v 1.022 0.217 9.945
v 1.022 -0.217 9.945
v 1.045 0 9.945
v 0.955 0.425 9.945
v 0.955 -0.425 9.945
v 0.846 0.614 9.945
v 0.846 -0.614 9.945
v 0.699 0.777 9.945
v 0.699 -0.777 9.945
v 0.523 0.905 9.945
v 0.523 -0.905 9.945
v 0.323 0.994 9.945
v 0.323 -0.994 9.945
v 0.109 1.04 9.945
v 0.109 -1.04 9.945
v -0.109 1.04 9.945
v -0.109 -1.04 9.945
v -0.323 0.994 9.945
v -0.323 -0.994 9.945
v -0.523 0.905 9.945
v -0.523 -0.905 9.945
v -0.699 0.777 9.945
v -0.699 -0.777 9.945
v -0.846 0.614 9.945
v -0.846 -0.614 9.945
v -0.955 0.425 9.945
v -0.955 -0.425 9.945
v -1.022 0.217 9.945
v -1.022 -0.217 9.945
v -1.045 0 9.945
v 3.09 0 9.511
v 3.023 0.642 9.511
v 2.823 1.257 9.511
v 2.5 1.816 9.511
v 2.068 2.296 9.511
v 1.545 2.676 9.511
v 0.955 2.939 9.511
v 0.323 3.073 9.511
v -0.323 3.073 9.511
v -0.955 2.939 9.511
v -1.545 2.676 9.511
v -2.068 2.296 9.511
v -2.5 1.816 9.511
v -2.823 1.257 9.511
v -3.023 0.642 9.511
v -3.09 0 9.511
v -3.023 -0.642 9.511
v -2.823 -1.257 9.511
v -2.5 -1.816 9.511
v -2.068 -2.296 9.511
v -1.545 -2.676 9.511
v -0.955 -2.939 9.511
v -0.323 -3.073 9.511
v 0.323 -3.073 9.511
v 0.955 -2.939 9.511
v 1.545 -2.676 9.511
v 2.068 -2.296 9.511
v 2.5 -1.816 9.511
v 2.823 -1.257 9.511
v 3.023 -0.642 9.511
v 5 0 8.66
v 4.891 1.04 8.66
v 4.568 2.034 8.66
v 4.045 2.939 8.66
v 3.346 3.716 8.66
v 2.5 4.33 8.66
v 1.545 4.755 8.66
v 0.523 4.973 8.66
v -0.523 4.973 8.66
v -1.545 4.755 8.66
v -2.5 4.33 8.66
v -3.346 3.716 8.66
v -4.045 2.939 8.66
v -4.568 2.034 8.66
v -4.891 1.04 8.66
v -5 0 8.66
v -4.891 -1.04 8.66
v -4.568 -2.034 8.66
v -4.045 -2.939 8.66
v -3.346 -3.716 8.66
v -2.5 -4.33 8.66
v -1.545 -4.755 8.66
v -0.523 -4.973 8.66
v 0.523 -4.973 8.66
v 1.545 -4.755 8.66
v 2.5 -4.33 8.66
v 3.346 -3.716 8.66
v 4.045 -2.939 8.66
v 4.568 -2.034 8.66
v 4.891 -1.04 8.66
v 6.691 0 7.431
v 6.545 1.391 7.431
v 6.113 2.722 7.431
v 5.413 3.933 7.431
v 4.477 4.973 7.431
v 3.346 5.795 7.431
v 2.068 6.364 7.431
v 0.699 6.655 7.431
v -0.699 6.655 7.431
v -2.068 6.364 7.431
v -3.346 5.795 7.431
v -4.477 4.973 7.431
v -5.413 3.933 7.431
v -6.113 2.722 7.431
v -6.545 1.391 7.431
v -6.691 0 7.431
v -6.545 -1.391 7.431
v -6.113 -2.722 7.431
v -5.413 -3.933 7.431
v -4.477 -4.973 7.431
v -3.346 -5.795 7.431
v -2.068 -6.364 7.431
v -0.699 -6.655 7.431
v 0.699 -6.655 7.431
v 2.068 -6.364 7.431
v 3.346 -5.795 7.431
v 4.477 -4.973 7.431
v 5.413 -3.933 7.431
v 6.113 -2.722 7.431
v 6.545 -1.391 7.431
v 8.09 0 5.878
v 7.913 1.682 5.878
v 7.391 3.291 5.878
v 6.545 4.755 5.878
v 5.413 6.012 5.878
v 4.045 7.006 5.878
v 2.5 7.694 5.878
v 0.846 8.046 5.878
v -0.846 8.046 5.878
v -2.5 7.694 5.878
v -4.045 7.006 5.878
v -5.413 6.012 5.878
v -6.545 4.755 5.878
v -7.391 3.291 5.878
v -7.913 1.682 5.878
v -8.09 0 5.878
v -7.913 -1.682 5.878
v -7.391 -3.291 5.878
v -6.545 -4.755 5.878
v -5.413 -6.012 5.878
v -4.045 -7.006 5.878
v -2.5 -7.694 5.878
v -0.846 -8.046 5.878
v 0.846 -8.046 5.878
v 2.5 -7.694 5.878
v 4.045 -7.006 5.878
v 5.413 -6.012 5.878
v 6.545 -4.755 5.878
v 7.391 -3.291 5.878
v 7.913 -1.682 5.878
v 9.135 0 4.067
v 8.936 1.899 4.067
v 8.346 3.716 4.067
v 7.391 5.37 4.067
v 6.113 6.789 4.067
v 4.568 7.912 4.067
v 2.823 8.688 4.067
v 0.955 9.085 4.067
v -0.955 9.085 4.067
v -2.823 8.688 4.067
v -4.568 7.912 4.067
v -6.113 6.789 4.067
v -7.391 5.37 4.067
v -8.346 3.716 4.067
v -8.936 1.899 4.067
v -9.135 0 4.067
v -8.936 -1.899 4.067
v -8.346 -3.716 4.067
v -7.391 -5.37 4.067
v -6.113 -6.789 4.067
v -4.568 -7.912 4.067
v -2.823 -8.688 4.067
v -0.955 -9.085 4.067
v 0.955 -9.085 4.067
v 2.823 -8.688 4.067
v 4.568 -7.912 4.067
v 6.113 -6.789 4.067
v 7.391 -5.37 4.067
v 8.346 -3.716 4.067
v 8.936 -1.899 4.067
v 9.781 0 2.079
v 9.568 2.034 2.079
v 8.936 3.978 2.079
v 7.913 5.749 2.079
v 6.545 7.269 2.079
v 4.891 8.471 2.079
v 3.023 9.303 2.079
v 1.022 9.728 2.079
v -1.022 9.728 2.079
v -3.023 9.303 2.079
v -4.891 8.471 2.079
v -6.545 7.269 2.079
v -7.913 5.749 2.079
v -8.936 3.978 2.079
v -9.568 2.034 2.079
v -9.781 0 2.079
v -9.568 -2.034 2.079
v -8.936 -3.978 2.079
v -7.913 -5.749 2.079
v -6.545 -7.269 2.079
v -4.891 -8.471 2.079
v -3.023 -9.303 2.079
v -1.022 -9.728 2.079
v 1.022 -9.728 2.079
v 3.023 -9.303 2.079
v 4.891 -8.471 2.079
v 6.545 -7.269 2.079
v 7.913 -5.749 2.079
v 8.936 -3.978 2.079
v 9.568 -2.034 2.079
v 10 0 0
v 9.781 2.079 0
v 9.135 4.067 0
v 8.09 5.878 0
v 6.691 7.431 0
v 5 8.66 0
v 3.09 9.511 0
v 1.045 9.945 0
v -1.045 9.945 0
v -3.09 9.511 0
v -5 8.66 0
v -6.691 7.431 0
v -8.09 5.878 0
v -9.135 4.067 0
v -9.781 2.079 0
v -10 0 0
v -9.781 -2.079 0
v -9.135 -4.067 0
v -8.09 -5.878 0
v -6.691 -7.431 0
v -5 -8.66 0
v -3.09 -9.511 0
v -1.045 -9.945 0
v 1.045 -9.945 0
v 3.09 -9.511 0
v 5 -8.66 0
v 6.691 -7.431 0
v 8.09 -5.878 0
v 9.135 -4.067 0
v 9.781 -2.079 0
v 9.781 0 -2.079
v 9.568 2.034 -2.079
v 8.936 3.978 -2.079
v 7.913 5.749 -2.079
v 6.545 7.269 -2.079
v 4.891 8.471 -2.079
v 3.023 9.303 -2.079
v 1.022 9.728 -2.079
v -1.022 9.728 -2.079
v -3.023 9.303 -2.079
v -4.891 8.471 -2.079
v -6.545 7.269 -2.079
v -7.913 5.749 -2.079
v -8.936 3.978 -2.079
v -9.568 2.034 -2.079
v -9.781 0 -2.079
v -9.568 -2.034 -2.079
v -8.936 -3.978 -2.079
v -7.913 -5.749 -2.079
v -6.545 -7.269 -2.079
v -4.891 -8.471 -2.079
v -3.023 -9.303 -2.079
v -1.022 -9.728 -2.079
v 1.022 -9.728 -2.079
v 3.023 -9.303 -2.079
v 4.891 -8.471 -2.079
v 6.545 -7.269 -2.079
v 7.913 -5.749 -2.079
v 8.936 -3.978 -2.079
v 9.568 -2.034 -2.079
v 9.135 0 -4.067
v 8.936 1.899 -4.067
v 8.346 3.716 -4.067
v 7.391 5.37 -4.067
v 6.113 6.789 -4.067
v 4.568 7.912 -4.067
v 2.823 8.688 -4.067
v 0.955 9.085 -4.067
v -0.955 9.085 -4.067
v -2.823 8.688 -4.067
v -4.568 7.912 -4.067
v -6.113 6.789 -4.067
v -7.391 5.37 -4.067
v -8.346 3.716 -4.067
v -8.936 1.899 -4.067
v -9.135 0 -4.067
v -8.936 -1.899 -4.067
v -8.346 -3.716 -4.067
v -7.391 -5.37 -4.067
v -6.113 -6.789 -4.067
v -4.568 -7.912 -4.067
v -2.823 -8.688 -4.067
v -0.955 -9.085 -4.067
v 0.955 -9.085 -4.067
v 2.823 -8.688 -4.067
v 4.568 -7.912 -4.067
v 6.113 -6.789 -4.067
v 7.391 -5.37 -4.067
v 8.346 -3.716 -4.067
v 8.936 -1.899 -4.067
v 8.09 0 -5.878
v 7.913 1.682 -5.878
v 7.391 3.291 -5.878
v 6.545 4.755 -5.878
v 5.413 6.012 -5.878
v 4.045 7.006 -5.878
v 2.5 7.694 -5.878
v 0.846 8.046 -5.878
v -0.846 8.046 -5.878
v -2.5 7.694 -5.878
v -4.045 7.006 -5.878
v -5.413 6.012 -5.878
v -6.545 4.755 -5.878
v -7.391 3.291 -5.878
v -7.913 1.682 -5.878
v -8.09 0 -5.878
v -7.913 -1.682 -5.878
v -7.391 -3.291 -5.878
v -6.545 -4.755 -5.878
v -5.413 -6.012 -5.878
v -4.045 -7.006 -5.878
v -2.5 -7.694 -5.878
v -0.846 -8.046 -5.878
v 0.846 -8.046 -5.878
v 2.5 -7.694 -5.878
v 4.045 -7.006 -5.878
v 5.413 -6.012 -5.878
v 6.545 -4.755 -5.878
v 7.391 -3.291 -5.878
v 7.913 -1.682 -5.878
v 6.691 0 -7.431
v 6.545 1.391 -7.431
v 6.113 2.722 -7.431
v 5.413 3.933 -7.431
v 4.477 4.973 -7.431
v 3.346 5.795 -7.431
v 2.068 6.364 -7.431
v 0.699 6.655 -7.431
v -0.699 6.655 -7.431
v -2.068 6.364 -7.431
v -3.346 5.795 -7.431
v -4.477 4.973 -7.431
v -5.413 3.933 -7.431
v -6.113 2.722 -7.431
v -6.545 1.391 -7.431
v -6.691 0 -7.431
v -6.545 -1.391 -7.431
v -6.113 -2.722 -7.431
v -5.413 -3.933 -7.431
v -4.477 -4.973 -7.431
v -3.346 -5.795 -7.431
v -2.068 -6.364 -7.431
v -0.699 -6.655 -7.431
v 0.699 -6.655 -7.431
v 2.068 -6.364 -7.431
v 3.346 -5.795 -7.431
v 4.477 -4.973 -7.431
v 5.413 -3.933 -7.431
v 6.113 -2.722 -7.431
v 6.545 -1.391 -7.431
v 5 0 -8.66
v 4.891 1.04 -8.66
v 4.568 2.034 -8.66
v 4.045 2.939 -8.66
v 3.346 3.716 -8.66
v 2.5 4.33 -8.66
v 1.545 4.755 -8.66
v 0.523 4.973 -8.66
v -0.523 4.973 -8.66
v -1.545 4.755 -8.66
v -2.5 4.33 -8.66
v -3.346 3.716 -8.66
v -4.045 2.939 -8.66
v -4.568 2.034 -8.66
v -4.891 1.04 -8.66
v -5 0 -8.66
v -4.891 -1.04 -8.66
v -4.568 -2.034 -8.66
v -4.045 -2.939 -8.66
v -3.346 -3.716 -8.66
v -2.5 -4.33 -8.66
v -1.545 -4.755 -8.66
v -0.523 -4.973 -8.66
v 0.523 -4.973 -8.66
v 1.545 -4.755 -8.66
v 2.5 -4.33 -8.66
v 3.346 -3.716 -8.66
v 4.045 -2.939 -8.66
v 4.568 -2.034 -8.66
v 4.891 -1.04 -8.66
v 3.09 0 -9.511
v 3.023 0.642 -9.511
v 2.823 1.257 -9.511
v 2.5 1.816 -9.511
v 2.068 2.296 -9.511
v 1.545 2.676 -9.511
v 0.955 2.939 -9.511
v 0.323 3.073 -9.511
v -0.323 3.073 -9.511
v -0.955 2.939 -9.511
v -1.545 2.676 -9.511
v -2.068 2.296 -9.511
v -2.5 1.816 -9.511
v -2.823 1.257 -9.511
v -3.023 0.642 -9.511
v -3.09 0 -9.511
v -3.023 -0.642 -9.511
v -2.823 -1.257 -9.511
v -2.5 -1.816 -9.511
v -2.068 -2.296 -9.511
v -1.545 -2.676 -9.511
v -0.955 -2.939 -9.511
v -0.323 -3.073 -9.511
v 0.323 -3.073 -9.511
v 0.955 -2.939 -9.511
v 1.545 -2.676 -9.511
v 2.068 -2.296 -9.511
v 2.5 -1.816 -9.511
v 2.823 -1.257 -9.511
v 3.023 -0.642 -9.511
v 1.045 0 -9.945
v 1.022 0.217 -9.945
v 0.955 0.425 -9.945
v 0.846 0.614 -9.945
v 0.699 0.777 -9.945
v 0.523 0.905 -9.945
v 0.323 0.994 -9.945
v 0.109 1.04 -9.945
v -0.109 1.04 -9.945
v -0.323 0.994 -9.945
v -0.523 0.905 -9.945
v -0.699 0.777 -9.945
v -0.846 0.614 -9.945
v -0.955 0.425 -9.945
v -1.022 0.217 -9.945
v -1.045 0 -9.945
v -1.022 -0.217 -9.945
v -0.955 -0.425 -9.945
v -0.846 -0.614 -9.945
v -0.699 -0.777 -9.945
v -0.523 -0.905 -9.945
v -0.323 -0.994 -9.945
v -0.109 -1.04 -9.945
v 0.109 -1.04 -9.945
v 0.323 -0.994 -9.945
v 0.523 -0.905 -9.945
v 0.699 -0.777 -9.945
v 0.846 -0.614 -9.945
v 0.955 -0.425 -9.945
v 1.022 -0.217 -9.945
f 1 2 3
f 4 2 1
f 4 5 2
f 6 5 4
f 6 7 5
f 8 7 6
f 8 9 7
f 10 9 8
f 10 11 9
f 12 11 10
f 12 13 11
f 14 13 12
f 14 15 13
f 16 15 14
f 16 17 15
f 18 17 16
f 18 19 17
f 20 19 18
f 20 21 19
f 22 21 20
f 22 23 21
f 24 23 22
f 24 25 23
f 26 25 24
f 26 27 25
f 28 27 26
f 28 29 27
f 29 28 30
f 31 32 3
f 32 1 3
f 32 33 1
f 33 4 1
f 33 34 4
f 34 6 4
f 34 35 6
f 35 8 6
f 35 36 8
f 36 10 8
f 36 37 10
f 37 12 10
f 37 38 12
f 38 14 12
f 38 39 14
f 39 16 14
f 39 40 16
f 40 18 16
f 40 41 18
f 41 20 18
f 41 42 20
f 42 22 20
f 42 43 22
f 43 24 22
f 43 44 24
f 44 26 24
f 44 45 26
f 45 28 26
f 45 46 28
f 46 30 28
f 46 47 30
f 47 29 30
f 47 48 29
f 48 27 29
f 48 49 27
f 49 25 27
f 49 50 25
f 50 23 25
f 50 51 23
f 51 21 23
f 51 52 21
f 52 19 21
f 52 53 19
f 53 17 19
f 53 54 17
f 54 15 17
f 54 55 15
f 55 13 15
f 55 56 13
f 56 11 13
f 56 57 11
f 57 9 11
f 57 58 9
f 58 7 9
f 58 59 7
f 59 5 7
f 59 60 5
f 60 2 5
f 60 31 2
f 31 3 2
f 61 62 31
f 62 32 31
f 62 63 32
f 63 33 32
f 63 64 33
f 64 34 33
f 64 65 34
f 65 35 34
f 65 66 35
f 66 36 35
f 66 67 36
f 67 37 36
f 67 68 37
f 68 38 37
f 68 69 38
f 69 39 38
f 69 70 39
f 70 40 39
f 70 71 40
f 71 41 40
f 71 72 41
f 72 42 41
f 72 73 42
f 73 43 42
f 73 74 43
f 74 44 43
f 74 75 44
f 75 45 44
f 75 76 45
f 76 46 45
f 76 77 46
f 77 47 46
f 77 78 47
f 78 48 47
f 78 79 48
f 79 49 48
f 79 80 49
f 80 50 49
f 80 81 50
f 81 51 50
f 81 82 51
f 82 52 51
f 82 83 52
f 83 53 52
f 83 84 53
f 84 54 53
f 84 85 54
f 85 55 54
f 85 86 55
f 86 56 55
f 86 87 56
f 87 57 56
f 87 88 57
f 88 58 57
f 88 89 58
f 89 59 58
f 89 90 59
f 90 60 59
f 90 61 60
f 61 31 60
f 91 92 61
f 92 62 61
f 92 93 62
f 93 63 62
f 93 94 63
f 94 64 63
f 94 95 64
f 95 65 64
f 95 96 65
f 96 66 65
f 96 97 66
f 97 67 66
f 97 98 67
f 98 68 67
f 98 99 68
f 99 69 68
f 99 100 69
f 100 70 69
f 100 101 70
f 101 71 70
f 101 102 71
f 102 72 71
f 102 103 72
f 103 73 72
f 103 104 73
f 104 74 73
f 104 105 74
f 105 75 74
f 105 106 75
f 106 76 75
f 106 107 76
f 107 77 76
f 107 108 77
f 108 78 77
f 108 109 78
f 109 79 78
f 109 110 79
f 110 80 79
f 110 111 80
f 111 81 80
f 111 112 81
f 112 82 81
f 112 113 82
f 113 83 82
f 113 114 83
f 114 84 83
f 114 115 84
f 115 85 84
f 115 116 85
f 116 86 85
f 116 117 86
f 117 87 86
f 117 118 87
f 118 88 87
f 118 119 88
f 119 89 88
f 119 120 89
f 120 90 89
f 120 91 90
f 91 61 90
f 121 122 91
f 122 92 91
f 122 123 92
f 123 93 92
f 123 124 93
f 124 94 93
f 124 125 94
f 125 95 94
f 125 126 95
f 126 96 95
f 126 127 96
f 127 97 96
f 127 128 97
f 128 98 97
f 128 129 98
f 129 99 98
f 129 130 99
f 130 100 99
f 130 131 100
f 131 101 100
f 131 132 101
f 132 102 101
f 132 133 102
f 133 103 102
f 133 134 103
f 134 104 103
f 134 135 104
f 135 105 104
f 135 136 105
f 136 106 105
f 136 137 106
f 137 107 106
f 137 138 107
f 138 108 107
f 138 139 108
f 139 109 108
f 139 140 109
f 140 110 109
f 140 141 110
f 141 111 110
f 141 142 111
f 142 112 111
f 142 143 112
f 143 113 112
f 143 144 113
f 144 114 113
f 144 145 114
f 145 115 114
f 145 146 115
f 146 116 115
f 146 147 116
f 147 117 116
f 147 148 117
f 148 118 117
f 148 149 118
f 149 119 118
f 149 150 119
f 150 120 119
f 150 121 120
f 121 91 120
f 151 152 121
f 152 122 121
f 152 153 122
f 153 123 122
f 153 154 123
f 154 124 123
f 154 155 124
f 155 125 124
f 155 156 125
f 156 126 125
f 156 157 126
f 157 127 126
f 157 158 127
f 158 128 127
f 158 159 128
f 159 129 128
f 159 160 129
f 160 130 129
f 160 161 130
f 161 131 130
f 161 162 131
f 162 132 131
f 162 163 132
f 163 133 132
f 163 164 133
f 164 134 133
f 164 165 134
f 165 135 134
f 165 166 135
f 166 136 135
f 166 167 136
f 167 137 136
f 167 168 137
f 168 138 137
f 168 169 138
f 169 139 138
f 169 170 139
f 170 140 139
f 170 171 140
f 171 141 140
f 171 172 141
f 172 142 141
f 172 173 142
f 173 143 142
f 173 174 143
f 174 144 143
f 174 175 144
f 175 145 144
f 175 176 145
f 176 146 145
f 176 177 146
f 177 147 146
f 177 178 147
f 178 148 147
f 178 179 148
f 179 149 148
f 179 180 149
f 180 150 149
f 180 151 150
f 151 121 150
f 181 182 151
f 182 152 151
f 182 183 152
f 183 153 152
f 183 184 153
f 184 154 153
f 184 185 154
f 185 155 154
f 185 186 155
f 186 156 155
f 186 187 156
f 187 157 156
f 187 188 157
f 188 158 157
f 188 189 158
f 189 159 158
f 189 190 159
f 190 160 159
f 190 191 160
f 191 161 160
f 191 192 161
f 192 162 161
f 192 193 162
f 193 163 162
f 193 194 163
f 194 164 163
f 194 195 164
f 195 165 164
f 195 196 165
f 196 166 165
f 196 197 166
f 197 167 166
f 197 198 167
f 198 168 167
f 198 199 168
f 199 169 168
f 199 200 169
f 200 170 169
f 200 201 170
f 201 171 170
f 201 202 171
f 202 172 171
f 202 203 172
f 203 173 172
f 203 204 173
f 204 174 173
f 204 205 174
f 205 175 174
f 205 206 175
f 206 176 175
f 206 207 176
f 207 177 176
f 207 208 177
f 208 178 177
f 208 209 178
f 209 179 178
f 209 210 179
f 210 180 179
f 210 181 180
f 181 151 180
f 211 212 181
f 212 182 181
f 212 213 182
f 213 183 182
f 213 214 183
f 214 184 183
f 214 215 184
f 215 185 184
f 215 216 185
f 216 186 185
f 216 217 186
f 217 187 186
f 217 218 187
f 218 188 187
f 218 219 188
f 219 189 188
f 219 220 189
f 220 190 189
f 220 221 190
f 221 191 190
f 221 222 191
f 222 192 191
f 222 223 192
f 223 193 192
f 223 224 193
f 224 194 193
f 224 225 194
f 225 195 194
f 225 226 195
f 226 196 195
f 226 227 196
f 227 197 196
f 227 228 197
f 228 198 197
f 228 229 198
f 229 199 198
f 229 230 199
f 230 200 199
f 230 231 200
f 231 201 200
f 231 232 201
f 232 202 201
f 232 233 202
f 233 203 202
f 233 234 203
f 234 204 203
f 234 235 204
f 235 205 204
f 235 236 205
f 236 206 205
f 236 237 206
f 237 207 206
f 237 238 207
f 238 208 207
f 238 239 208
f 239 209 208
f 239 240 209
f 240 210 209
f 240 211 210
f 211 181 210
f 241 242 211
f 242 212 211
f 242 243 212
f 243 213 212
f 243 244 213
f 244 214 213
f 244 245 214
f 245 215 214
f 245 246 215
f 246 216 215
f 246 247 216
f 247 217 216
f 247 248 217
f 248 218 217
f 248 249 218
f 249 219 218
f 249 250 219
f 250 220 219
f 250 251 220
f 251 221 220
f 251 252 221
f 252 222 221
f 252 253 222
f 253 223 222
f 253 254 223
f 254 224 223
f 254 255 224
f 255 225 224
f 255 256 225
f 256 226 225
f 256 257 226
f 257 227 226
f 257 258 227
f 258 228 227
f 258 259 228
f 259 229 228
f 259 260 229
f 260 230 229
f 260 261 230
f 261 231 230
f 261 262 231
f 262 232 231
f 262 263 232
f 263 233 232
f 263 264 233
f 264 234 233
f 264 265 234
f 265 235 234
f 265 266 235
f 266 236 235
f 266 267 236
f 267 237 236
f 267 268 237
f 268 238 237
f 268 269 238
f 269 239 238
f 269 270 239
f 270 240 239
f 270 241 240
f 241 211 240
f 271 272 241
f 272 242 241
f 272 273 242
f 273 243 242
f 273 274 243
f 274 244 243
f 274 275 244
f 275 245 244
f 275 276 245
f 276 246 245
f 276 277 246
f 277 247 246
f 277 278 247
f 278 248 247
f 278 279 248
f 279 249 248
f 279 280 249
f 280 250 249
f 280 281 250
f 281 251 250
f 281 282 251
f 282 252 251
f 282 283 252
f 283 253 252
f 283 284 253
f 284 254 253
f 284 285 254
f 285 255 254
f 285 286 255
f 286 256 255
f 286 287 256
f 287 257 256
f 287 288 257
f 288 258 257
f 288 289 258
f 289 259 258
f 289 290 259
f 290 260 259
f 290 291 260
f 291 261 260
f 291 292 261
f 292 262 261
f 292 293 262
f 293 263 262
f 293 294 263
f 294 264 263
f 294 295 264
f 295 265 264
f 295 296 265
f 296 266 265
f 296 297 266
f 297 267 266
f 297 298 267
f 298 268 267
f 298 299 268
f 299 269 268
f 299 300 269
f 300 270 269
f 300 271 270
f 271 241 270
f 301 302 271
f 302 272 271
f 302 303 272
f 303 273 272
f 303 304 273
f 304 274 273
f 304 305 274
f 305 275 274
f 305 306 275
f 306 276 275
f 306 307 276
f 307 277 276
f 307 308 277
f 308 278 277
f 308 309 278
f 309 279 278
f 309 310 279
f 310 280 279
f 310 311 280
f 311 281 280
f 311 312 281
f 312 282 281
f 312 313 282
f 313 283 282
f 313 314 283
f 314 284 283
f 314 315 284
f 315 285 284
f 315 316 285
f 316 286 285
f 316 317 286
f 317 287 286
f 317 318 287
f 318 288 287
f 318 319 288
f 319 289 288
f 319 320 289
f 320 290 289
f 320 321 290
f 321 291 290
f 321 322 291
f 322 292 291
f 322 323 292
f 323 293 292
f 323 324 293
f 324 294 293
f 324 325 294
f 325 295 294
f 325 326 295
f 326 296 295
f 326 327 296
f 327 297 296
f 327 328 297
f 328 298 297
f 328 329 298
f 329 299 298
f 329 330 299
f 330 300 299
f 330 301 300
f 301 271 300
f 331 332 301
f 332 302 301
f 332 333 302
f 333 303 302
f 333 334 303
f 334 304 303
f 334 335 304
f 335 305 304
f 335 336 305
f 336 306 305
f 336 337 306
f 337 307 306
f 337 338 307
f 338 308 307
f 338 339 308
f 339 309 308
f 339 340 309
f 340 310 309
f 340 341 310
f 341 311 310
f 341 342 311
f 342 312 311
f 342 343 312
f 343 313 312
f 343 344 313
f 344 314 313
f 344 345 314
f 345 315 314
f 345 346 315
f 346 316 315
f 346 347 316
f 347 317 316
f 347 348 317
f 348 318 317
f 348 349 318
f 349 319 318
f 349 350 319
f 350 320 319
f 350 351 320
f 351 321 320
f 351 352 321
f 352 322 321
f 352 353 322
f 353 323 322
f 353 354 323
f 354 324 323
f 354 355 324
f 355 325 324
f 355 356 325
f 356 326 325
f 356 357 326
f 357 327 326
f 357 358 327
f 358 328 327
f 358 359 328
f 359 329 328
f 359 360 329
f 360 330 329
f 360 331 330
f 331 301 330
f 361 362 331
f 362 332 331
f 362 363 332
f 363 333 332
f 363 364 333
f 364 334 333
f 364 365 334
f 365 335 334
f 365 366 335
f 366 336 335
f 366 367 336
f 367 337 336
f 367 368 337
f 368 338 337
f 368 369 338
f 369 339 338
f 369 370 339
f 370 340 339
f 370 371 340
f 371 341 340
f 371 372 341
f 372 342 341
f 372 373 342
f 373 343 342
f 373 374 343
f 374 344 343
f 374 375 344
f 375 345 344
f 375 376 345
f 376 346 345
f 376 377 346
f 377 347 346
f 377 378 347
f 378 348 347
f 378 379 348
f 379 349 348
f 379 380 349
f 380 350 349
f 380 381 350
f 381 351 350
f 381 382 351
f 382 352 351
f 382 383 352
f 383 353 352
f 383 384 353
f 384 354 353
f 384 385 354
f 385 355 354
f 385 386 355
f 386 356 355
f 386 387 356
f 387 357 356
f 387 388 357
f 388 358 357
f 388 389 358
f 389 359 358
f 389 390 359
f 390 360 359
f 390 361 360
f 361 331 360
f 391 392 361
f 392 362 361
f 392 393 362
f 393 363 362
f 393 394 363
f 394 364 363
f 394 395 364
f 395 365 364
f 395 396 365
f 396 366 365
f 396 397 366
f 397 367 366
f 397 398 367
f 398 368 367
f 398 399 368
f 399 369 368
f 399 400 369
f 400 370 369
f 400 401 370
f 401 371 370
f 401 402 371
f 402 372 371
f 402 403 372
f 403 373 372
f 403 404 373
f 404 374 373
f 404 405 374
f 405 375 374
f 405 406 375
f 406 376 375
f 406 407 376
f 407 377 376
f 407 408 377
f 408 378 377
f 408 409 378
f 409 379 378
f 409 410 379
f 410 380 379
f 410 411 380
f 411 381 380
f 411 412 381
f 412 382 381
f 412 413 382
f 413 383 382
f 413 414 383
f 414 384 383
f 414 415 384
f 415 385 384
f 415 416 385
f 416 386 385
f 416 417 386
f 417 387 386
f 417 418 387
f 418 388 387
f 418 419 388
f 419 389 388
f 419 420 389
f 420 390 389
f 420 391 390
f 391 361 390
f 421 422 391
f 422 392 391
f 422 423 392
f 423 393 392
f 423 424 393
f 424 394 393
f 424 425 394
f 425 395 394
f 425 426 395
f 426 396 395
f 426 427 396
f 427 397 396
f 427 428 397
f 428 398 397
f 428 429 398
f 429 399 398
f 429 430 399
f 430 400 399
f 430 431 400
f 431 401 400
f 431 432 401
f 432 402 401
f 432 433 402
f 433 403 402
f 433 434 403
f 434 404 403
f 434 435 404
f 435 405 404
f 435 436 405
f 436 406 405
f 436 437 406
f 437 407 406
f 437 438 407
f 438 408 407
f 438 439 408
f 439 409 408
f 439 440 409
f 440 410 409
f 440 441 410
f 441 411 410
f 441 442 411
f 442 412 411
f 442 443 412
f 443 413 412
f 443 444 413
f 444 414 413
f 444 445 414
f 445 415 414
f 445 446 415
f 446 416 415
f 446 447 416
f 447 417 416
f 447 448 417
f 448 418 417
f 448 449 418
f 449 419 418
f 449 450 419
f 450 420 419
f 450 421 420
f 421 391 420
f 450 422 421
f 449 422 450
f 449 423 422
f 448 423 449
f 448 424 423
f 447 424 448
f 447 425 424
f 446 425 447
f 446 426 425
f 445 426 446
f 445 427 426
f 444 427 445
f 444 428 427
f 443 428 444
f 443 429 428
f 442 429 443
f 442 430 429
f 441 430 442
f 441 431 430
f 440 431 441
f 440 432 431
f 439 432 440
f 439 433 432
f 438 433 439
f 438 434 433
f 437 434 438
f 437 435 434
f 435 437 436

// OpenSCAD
difference() {
  sphere(r=10);
  %cylinder(h=30, r=6, center=true);
}
